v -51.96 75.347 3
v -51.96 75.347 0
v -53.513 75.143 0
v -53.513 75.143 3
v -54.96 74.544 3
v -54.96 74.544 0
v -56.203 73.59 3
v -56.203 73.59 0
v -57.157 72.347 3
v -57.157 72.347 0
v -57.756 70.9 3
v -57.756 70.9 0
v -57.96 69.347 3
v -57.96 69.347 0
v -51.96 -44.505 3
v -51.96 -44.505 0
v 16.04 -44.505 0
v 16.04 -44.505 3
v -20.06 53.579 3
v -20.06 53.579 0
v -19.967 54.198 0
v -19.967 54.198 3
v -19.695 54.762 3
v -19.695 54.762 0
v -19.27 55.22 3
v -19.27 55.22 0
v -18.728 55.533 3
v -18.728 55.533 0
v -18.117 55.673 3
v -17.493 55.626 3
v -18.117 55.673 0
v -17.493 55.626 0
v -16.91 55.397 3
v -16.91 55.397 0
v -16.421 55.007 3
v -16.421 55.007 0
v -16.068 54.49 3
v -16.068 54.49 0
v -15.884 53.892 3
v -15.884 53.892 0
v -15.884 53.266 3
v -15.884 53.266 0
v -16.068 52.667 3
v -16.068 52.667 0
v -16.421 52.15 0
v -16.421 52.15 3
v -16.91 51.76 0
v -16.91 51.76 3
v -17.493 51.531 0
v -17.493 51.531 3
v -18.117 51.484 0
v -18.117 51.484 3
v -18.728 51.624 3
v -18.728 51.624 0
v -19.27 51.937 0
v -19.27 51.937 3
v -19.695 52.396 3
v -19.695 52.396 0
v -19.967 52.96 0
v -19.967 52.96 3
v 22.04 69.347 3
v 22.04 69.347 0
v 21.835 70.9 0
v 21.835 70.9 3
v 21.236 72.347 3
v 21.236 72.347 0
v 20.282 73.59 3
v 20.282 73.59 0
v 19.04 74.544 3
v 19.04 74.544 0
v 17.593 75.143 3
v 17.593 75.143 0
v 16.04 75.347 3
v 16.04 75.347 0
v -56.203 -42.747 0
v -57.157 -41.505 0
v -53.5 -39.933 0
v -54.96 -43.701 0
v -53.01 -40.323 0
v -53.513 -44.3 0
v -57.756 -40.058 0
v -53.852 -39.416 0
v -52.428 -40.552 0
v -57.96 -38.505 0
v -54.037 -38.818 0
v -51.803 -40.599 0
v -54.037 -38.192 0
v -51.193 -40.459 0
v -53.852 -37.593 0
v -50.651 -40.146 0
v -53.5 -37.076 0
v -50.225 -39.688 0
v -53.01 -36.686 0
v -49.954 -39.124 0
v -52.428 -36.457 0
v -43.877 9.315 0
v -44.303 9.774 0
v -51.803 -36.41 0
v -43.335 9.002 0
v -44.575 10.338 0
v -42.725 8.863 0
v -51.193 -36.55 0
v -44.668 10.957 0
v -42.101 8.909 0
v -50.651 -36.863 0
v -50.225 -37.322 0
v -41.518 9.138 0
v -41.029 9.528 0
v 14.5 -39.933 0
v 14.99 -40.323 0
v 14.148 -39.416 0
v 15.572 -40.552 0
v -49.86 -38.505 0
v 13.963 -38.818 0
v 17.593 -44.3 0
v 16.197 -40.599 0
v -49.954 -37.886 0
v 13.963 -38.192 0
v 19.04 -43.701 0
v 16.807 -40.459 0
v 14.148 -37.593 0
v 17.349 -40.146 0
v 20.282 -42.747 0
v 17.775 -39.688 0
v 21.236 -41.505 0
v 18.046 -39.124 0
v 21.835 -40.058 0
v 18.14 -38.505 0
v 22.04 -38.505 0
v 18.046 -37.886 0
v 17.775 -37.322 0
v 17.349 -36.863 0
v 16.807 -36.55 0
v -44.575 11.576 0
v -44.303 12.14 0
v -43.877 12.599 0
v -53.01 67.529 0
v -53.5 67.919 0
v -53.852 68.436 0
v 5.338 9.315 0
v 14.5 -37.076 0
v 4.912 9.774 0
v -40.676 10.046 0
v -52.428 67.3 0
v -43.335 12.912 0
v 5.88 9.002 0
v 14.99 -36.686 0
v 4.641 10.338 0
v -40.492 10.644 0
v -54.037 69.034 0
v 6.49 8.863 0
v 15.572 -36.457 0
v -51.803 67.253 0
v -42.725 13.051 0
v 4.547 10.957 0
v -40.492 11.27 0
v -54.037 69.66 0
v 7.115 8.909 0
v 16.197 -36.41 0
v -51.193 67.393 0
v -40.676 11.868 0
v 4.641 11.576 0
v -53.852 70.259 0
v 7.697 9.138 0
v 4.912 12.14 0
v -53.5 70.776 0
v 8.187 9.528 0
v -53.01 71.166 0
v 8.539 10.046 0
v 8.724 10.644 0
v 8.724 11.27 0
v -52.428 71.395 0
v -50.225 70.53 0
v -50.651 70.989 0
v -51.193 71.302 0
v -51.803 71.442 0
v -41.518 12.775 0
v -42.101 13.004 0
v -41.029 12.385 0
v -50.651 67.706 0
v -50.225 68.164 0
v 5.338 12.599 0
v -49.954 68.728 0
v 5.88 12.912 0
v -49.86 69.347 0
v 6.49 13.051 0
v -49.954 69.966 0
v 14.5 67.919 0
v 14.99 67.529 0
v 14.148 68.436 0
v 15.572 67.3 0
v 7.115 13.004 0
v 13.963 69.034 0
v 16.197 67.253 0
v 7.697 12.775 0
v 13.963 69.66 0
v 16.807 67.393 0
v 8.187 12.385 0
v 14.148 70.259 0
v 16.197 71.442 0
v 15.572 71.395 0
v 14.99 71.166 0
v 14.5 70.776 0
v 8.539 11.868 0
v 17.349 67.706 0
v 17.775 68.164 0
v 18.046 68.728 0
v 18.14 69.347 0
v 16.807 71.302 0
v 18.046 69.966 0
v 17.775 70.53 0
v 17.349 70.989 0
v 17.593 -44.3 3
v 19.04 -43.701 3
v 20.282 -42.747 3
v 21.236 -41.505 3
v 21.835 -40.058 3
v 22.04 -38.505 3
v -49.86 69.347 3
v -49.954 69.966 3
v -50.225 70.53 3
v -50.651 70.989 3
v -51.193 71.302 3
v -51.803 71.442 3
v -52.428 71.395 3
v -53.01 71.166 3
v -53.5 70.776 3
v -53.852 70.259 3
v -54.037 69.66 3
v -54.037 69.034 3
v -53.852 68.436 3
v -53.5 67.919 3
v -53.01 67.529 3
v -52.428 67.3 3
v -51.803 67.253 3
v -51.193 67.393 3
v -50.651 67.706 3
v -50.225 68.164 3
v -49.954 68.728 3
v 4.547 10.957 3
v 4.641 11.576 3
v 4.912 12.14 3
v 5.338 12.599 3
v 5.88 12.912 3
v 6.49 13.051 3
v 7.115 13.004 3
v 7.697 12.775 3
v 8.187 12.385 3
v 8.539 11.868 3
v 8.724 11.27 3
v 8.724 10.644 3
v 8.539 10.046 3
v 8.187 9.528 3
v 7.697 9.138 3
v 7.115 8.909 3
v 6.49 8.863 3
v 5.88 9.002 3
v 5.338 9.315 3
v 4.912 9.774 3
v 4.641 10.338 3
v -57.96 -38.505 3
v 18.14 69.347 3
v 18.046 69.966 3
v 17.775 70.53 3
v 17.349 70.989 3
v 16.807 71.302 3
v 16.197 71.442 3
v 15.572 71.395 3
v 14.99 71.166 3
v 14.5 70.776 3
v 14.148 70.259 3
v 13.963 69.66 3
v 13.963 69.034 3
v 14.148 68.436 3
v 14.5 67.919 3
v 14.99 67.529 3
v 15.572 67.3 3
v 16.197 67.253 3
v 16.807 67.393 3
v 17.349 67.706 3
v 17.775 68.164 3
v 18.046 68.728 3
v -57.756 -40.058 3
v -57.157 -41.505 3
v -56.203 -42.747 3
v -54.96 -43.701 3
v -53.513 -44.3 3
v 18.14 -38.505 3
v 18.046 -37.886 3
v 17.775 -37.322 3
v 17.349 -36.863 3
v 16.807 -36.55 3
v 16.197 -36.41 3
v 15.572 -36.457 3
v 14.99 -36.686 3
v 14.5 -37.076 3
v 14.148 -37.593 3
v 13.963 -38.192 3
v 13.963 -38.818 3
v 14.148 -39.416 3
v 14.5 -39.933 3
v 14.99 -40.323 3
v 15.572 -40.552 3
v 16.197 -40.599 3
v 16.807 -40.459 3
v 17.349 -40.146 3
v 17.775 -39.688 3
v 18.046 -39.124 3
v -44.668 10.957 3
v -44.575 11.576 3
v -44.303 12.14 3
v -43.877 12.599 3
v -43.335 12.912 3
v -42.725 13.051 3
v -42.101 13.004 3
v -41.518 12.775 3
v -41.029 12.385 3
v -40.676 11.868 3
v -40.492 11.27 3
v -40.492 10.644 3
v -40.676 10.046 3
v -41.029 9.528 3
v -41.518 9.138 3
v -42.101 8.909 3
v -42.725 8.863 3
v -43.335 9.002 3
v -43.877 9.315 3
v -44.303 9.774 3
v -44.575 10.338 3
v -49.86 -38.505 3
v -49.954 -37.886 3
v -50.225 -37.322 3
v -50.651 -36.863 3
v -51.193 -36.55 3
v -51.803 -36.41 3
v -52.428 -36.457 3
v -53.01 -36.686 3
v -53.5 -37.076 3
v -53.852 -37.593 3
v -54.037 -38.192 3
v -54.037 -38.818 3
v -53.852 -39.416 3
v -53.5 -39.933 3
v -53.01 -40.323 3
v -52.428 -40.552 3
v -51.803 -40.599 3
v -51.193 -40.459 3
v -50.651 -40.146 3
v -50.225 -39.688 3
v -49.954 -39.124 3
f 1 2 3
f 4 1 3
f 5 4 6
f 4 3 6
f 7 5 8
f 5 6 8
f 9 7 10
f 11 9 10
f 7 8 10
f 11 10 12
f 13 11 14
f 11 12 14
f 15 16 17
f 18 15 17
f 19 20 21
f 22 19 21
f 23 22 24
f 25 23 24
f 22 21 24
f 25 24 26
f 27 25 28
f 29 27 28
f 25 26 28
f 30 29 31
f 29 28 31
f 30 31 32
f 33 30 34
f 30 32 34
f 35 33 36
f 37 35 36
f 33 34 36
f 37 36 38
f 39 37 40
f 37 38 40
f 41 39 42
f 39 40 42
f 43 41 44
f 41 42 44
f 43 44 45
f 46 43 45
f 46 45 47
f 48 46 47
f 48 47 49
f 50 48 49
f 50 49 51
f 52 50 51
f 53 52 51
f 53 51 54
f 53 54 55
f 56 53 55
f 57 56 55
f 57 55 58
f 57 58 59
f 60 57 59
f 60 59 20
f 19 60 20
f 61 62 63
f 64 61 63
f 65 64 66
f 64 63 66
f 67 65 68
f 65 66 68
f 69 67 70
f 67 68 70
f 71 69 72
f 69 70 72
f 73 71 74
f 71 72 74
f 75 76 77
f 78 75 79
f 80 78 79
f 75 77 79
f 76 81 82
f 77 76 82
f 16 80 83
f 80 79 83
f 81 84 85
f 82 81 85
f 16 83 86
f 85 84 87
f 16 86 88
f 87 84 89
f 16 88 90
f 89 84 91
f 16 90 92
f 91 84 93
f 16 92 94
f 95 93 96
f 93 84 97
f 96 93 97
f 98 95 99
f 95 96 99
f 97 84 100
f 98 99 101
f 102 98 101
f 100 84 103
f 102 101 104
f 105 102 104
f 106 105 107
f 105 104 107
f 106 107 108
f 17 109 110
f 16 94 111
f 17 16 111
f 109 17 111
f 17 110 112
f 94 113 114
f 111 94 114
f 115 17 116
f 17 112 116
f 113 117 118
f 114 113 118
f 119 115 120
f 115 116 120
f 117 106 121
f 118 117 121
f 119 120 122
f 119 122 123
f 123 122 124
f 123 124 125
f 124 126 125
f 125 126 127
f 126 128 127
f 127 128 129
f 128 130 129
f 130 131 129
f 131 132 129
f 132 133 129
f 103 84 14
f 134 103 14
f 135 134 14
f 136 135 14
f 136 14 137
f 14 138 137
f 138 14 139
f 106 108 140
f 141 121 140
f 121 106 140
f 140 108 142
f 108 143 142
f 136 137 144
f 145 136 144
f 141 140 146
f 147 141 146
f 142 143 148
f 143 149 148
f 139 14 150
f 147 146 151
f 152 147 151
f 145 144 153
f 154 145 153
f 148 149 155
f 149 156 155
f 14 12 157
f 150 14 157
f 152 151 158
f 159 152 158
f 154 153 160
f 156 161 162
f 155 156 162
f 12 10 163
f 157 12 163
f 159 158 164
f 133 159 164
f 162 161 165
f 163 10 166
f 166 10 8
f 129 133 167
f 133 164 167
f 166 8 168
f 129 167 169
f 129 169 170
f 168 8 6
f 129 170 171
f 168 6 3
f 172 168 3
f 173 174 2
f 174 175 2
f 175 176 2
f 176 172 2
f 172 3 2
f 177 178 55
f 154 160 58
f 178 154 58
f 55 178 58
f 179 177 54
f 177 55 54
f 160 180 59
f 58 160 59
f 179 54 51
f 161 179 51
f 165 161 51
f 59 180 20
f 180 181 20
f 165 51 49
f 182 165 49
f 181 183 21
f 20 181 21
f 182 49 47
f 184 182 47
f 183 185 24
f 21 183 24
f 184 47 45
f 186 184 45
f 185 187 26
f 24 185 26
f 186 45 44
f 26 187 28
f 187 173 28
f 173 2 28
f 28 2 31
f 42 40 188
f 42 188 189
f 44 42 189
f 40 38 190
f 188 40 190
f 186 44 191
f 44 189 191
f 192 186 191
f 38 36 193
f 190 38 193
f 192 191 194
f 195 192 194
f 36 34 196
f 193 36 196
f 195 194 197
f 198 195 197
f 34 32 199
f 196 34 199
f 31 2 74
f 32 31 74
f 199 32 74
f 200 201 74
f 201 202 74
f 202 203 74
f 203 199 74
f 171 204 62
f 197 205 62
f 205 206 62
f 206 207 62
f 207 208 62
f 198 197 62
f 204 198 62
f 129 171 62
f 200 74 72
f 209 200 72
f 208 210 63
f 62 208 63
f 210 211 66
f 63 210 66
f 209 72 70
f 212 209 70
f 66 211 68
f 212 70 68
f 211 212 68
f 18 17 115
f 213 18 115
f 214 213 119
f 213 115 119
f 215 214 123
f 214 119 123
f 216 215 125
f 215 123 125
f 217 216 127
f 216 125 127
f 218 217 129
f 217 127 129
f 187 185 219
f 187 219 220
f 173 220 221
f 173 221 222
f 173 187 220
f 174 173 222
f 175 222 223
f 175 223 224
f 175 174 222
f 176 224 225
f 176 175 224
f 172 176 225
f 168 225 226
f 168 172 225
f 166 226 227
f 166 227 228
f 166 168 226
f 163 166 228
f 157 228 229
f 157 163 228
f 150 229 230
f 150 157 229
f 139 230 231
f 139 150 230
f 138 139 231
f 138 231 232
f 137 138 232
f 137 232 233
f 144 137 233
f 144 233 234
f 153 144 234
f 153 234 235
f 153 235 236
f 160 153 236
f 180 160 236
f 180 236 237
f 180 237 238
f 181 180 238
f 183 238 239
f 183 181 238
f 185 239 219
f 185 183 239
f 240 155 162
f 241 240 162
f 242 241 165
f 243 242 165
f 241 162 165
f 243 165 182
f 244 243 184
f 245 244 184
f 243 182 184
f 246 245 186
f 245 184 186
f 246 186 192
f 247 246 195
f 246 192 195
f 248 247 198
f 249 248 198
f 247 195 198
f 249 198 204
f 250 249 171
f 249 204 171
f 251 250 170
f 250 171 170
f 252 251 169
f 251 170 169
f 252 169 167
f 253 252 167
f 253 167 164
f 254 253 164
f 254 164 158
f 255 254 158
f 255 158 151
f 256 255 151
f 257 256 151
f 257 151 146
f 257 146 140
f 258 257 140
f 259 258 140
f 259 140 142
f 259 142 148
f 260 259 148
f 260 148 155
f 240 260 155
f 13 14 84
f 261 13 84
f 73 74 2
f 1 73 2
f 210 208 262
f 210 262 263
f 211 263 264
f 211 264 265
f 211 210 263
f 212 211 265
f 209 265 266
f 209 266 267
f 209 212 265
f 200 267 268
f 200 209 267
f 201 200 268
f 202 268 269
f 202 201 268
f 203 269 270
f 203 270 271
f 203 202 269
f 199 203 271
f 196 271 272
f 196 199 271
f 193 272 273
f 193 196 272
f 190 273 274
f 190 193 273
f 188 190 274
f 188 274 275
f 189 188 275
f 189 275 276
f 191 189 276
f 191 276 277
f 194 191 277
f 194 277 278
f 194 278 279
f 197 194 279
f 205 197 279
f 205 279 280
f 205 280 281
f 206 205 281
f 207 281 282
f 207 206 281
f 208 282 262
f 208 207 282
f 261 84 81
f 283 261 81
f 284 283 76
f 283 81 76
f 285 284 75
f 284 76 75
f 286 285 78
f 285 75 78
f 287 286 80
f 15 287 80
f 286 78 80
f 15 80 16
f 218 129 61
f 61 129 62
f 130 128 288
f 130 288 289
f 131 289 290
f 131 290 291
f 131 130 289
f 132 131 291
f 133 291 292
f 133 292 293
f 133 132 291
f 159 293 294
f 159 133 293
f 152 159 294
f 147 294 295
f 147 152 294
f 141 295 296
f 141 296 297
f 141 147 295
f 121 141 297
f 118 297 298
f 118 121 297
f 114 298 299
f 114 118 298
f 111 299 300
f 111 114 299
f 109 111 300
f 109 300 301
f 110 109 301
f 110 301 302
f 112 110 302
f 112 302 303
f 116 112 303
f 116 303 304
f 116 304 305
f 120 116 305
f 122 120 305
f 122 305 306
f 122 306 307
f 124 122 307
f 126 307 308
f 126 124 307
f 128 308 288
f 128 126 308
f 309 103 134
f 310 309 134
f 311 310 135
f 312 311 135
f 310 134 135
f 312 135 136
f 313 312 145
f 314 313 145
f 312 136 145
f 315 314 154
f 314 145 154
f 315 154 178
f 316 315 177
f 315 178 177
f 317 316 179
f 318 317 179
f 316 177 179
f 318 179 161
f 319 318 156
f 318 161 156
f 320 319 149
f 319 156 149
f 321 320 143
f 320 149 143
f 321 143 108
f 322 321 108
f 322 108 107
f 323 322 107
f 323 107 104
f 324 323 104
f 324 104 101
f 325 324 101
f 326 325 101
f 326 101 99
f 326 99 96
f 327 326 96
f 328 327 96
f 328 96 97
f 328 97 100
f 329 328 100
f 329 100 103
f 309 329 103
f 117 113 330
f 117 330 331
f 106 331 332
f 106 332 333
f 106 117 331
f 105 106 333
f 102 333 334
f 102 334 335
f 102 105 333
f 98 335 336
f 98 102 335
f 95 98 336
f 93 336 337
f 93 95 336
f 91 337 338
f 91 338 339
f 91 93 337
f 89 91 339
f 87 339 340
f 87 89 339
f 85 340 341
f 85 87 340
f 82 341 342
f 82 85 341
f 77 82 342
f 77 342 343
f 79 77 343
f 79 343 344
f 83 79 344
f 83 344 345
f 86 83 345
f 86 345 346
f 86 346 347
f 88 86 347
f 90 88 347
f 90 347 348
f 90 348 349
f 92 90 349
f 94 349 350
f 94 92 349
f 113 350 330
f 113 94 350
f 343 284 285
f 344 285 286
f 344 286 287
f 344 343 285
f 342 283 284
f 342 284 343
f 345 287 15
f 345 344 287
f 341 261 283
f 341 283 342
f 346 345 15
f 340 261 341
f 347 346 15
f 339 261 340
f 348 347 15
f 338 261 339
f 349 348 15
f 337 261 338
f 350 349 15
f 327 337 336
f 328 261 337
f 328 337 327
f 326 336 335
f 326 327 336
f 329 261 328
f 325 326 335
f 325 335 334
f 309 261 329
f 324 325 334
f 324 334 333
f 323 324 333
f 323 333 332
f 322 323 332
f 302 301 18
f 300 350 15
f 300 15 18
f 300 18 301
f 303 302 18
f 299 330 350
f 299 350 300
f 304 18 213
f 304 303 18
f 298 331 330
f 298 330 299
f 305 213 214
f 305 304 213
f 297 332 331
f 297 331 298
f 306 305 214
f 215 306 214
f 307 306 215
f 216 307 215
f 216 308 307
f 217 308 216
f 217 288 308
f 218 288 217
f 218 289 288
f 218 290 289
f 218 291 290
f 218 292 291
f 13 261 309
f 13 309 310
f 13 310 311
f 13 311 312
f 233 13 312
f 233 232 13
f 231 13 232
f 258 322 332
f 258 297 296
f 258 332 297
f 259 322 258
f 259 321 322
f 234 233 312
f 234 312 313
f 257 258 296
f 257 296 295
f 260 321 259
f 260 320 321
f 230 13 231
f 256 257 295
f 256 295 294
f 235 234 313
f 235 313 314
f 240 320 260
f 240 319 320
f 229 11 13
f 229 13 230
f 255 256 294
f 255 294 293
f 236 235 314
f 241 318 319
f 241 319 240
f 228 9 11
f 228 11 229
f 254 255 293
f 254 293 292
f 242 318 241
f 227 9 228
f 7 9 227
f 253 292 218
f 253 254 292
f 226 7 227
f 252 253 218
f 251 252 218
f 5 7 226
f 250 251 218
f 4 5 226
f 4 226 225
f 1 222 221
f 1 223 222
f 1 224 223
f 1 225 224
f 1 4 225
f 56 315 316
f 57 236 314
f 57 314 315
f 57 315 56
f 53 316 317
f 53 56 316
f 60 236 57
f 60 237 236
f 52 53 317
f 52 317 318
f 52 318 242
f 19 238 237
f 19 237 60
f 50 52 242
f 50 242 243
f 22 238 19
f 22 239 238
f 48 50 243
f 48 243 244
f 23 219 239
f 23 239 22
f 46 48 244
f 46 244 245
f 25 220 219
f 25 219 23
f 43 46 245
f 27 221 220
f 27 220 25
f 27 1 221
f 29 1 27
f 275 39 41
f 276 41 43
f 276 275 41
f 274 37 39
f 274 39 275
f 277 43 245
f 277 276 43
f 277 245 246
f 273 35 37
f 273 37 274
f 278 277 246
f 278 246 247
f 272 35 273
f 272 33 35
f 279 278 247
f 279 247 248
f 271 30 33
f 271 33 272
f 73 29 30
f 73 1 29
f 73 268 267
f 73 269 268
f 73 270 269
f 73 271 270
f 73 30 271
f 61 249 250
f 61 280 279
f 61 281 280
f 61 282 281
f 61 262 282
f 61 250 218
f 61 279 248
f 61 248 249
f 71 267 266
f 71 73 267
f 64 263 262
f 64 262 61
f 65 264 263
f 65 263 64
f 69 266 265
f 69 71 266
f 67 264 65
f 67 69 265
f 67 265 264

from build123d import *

# Parameters (mm, degrees)
IZIM1_R                     = 2.1
Y_KSEKLIK_EKSTR_ZYON1_DEPTH = 3
IZIM2_R                     = 2.1
KES_EKSTR_ZYON1_DEPTH       = 10


with BuildPart() as part:
    # Çizim1 → Yükseklik-Ekstrüzyon1 (new body)
    with BuildSketch(Plane.XY):
        with BuildLine():
            Line((22.039642989, -38.504590939), (22.039642989, 69.347448082))
            ThreePointArc((22.039642989, 69.347448082), (20.282283676, 73.590088769), (16.039642989, 75.347448082))
            Line((16.039642989, 75.347448082), (-51.960357011, 75.347448082))
            ThreePointArc((-51.960357011, 75.347448082), (-56.202997698, 73.590088769), (-57.960357011, 69.347448082))
            Line((-57.960357011, 69.347448082), (-57.960357011, -38.504590939))
            ThreePointArc((-57.960357011, -38.504590939), (-56.202997698, -42.747231626), (-51.960357011, -44.504590939))
            Line((-51.960357011, -44.504590939), (16.039642989, -44.504590939))
            ThreePointArc((16.039642989, -44.504590939), (20.282283676, -42.747231626), (22.039642989, -38.504590939))
        make_face()
        with Locations((-51.960357011, -38.504590939)):
            Circle(IZIM1_R, mode=Mode.SUBTRACT)
        with Locations((16.039642989, -38.504590939)):
            Circle(IZIM1_R, mode=Mode.SUBTRACT)
        with Locations((16.039642989, 69.347448082)):
            Circle(IZIM1_R, mode=Mode.SUBTRACT)
        with Locations((-51.960357011, 69.347448082)):
            Circle(IZIM1_R, mode=Mode.SUBTRACT)
    extrude(amount=Y_KSEKLIK_EKSTR_ZYON1_DEPTH)

    # Çizim2 → Kes-Ekstrüzyon1 (cut)
    with BuildSketch(Plane(origin=(0, 0, 0), x_dir=(-1, 0, 0), z_dir=(0, 0, -1))):
        with Locations((17.960357011, 53.578572425)):
            Circle(IZIM2_R)
        with Locations((42.568052166, 10.95679416)):
            Circle(IZIM2_R)
        with Locations((-6.647338144, 10.95679416)):
            Circle(IZIM2_R)
    extrude(amount=-KES_EKSTR_ZYON1_DEPTH, mode=Mode.SUBTRACT)


solid = part.part
